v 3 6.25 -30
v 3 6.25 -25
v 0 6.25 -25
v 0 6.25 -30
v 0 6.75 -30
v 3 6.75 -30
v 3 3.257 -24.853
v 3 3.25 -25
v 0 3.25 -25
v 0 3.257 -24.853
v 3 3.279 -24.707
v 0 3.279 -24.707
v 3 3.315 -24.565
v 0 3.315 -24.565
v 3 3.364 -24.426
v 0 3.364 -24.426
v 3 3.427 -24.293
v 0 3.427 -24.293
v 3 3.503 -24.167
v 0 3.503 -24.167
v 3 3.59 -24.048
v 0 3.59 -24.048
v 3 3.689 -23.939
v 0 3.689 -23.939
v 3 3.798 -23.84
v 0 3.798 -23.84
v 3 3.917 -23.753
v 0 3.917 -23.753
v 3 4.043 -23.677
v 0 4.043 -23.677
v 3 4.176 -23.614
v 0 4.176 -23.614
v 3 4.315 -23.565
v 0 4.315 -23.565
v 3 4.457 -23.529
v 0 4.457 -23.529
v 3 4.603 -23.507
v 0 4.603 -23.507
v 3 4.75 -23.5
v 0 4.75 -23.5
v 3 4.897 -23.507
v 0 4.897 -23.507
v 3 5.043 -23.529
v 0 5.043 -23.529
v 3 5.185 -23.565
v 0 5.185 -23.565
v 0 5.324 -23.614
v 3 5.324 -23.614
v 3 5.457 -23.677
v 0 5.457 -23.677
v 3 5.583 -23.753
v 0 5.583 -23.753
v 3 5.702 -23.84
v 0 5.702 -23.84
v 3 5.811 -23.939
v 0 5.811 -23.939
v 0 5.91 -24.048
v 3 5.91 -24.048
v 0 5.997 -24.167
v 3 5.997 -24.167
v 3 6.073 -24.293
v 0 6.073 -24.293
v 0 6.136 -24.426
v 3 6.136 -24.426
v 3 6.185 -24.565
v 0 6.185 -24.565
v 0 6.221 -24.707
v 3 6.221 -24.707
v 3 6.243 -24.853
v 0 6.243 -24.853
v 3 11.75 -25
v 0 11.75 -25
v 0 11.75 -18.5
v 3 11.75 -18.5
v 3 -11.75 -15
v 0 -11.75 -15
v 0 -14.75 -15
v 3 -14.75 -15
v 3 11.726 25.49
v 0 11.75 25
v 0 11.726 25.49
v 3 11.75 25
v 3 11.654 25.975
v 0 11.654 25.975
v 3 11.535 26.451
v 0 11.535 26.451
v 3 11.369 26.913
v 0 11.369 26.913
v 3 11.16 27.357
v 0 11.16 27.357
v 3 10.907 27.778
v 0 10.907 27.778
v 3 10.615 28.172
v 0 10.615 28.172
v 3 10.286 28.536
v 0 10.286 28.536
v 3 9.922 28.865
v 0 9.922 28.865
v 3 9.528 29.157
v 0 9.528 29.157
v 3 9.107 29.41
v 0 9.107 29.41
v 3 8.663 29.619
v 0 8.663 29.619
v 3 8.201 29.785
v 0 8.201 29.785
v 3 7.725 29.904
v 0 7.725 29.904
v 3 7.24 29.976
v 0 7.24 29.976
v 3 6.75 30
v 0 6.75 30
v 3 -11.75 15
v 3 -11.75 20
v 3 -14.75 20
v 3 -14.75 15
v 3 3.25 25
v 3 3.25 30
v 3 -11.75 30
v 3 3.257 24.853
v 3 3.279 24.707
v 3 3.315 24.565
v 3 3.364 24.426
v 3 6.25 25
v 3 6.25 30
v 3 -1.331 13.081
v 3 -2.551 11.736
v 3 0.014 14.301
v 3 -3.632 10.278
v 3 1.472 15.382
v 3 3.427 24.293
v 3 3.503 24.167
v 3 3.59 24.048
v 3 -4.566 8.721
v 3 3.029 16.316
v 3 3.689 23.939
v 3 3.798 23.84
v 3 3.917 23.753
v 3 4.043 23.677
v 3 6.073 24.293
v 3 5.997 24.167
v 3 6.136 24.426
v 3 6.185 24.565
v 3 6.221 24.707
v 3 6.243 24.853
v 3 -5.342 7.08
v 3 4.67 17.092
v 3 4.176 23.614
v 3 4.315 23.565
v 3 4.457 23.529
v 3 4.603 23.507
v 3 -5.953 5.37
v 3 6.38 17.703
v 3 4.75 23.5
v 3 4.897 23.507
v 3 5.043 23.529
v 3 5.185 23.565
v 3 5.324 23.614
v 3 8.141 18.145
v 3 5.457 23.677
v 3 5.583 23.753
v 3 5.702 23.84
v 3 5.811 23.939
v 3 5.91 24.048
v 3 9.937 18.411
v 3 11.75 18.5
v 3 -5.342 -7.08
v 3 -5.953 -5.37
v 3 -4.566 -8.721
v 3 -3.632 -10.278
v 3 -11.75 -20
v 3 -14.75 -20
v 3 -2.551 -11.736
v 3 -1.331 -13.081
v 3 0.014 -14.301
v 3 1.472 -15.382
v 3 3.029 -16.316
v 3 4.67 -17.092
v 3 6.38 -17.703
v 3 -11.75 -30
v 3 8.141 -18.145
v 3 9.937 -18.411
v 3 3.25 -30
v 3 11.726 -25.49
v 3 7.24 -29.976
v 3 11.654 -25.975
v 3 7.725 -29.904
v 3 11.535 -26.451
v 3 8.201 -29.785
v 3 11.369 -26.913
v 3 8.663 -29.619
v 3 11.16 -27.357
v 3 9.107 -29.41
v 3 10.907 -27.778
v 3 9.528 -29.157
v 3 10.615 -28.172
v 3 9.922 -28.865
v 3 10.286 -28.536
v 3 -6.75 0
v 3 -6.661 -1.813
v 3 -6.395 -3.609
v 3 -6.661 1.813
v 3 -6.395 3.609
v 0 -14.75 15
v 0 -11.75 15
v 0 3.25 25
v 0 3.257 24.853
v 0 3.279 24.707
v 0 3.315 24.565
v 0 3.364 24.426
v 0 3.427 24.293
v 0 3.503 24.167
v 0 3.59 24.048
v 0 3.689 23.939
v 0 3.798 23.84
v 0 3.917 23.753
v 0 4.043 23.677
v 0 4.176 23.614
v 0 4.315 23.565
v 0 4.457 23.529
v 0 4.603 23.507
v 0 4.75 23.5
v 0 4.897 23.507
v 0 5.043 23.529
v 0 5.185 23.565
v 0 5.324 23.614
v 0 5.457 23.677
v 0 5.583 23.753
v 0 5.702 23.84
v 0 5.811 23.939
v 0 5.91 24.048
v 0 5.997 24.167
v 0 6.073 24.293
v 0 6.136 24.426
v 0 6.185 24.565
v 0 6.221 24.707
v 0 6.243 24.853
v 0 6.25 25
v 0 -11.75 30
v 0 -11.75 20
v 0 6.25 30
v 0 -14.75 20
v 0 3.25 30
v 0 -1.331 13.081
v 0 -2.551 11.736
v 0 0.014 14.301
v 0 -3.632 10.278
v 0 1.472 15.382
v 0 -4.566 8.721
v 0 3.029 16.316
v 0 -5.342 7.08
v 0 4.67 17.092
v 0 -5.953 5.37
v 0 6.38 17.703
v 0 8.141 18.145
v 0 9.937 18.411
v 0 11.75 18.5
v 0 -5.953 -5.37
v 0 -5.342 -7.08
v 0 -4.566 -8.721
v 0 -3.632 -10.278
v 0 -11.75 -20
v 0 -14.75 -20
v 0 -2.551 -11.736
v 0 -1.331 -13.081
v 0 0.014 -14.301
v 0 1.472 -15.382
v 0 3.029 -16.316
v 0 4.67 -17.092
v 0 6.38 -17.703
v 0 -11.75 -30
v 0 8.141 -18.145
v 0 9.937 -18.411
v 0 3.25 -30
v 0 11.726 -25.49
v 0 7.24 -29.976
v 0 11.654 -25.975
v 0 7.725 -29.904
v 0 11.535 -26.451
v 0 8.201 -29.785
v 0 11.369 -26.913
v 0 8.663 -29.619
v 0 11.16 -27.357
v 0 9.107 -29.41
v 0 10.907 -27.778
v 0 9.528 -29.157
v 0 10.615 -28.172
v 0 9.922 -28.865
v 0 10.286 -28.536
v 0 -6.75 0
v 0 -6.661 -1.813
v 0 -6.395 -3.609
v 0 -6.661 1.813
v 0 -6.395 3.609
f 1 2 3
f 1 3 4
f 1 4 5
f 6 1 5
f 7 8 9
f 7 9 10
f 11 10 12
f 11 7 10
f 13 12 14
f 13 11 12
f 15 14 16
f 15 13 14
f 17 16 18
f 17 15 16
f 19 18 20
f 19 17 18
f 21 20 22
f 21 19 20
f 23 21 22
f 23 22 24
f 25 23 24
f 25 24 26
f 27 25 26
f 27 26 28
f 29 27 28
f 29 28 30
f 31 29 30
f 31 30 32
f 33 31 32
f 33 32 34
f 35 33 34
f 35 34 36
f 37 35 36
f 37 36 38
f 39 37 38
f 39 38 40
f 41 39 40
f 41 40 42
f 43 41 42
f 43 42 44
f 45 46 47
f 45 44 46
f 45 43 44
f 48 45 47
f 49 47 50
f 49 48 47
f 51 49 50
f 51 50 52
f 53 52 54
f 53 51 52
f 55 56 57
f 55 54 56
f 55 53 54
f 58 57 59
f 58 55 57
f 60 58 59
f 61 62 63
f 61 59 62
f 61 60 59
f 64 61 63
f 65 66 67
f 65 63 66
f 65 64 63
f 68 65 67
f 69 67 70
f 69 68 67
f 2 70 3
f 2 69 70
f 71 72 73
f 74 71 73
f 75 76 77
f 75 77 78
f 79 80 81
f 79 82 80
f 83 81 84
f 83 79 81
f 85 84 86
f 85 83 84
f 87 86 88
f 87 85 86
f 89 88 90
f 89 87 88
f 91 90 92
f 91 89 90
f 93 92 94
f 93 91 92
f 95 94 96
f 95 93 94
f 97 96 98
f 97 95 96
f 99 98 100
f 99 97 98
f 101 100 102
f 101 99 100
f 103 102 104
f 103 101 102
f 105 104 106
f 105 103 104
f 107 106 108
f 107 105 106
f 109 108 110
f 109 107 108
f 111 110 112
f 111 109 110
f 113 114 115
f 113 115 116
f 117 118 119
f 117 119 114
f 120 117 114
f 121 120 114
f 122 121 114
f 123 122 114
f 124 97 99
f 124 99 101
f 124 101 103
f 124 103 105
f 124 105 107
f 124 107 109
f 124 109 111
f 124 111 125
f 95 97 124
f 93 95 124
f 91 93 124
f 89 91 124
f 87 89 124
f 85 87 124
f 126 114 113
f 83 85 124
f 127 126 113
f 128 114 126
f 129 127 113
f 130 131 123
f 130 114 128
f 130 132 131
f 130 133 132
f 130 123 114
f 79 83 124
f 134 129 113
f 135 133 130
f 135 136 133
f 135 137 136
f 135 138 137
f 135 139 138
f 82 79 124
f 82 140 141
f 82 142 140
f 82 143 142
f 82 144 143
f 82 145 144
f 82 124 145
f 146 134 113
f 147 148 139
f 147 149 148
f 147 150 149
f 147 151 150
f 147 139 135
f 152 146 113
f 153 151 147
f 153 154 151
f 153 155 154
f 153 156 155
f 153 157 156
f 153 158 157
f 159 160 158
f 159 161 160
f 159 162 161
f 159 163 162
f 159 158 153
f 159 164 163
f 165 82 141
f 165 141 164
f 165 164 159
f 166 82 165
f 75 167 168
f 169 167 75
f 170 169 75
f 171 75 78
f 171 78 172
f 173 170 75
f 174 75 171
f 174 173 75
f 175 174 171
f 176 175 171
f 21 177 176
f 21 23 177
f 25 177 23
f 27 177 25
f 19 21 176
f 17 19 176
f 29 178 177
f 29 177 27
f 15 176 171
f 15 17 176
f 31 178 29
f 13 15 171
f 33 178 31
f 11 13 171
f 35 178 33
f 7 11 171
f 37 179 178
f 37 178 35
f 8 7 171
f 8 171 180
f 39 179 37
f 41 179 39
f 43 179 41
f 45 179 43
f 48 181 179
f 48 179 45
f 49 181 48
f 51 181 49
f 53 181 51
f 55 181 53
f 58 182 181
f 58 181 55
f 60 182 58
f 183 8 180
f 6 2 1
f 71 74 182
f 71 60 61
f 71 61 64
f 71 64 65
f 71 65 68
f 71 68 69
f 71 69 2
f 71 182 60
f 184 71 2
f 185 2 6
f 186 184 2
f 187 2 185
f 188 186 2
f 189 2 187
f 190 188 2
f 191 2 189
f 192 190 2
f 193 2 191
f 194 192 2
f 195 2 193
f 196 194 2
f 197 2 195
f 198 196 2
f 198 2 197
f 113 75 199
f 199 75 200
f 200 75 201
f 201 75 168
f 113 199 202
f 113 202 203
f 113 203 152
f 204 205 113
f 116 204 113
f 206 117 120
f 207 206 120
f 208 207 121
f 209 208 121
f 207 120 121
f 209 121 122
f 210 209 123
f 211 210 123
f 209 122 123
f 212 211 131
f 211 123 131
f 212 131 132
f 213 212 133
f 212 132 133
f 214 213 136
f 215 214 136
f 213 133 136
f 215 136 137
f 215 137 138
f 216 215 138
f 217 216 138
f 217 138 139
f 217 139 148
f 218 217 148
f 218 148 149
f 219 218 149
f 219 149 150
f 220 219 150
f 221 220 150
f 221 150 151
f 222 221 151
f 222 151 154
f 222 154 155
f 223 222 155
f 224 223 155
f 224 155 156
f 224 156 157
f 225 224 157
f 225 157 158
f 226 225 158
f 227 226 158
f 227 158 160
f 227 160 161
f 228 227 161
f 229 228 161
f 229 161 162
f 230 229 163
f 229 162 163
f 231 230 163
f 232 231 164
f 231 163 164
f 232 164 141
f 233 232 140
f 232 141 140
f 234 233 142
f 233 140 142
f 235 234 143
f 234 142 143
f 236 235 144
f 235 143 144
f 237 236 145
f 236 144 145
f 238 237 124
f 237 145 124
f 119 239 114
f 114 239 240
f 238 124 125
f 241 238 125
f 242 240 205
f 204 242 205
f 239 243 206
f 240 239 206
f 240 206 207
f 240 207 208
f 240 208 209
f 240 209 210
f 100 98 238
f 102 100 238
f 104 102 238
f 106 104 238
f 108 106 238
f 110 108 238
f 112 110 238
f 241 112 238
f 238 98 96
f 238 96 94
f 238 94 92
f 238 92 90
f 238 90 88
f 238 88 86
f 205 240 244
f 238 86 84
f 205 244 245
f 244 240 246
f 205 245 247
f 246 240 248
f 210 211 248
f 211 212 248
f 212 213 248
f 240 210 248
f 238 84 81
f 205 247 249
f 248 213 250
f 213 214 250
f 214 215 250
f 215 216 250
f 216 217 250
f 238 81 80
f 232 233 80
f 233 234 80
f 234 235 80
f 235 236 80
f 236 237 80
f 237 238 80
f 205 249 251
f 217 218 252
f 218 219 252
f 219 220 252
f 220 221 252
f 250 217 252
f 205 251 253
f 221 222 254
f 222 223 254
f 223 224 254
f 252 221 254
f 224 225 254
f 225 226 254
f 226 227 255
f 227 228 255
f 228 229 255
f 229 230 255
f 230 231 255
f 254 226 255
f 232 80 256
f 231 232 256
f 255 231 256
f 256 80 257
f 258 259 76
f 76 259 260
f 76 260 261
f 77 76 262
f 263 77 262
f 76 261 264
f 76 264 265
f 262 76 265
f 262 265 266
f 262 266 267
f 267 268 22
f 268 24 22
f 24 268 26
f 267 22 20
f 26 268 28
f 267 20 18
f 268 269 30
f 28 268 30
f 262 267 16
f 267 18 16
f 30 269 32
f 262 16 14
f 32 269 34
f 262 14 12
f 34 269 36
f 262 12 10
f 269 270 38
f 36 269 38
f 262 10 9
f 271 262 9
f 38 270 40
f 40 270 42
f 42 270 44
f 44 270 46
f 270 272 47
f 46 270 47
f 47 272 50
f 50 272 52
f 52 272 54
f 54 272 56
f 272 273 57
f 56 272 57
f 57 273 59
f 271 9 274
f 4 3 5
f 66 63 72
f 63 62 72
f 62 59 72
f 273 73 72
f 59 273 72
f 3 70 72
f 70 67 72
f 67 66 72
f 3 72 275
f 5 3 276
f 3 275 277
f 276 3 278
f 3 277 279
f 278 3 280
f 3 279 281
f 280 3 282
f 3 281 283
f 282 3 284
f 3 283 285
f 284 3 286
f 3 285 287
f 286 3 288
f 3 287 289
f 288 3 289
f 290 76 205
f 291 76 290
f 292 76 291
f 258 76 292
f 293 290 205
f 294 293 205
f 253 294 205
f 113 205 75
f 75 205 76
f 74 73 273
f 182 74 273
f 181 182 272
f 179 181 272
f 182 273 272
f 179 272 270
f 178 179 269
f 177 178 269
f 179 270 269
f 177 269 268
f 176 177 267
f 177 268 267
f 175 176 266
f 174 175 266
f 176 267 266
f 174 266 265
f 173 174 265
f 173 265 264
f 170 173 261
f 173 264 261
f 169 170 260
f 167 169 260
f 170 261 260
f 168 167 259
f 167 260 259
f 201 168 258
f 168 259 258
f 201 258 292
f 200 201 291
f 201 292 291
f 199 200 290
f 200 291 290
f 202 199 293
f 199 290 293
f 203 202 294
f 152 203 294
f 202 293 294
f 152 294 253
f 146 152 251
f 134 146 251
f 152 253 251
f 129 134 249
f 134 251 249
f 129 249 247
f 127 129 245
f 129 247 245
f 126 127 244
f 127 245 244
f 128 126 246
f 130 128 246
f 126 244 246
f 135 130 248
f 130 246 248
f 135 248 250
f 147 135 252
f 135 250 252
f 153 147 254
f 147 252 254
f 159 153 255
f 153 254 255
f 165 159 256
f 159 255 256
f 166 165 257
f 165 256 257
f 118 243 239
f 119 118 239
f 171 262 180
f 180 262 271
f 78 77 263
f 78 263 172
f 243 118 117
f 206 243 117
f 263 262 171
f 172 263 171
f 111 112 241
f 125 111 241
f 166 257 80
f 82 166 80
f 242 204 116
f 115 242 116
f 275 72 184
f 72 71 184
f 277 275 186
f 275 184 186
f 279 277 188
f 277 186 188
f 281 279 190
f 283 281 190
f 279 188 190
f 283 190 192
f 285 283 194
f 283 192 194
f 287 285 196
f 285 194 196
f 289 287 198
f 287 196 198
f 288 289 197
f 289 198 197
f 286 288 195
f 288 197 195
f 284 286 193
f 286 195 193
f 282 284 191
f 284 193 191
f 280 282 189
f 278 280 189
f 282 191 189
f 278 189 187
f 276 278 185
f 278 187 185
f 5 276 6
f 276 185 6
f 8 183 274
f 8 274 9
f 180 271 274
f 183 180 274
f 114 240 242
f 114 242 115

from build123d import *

# Parameters (mm, degrees)
BOSS_EXTRUDE1_DEPTH = 3
CUT_EXTRUDE2_DEPTH  = 4
FILLET2_R           = 5
SKETCH3_W           = 3
SKETCH3_H           = 5
BOSS_EXTRUDE2_DEPTH = 3


with BuildPart() as part:
    # Sketch1 → Boss-Extrude1 (new body)
    with BuildSketch(Plane(origin=(0, 0, 0), x_dir=(0, 0, -1), z_dir=(1, 0, 0))):
        with BuildLine():
            Line((-18.5, 11.75), (-30, 11.75))
            Line((-30, 11.75), (-30, -11.75))
            Line((-30, -11.75), (30, -11.75))
            Line((30, -11.75), (30, 11.75))
            Line((30, 11.75), (18.5, 11.75))
            ThreePointArc((18.5, 11.75), (0, -6.75), (-18.5, 11.75))
        make_face()
    extrude(amount=BOSS_EXTRUDE1_DEPTH)

    # Sketch2 → Cut-Extrude2 (cut, through all)
    with BuildSketch(Plane(origin=(3, 0, 0), x_dir=(0, 0, -1), z_dir=(1, 0, 0))):
        with BuildLine():
            Line((-25, 6.25), (-30, 6.25))
            Line((-30, 6.25), (-30, 3.25))
            Line((-30, 3.25), (-25, 3.25))
            ThreePointArc((-25, 3.25), (-23.5, 4.75), (-25, 6.25))
        make_face()
    cut_extrude2 = extrude(amount=-CUT_EXTRUDE2_DEPTH, mode=Mode.SUBTRACT)

    # Mirror2: Cut-Extrude2 across plane
    add(cut_extrude2.mirror(Plane.XY), mode=Mode.SUBTRACT)

    # Fillet2
    fillet2_edges = [part.edges().sort_by_distance(p)[0] for p in [
        (1.5, 11.75, 30),
        (1.5, 11.75, -30),
    ]]
    fillet(fillet2_edges, radius=FILLET2_R)

    # Sketch3 → Boss-Extrude2 (add)
    with BuildSketch(Plane.XZ.offset(11.75)):
        with Locations((1.5, -17.5)):
            Rectangle(SKETCH3_W, SKETCH3_H)
    boss_extrude2 = extrude(amount=BOSS_EXTRUDE2_DEPTH)

    # Mirror3: Boss-Extrude2 across plane
    add(boss_extrude2.mirror(Plane.XY))


solid = part.part
